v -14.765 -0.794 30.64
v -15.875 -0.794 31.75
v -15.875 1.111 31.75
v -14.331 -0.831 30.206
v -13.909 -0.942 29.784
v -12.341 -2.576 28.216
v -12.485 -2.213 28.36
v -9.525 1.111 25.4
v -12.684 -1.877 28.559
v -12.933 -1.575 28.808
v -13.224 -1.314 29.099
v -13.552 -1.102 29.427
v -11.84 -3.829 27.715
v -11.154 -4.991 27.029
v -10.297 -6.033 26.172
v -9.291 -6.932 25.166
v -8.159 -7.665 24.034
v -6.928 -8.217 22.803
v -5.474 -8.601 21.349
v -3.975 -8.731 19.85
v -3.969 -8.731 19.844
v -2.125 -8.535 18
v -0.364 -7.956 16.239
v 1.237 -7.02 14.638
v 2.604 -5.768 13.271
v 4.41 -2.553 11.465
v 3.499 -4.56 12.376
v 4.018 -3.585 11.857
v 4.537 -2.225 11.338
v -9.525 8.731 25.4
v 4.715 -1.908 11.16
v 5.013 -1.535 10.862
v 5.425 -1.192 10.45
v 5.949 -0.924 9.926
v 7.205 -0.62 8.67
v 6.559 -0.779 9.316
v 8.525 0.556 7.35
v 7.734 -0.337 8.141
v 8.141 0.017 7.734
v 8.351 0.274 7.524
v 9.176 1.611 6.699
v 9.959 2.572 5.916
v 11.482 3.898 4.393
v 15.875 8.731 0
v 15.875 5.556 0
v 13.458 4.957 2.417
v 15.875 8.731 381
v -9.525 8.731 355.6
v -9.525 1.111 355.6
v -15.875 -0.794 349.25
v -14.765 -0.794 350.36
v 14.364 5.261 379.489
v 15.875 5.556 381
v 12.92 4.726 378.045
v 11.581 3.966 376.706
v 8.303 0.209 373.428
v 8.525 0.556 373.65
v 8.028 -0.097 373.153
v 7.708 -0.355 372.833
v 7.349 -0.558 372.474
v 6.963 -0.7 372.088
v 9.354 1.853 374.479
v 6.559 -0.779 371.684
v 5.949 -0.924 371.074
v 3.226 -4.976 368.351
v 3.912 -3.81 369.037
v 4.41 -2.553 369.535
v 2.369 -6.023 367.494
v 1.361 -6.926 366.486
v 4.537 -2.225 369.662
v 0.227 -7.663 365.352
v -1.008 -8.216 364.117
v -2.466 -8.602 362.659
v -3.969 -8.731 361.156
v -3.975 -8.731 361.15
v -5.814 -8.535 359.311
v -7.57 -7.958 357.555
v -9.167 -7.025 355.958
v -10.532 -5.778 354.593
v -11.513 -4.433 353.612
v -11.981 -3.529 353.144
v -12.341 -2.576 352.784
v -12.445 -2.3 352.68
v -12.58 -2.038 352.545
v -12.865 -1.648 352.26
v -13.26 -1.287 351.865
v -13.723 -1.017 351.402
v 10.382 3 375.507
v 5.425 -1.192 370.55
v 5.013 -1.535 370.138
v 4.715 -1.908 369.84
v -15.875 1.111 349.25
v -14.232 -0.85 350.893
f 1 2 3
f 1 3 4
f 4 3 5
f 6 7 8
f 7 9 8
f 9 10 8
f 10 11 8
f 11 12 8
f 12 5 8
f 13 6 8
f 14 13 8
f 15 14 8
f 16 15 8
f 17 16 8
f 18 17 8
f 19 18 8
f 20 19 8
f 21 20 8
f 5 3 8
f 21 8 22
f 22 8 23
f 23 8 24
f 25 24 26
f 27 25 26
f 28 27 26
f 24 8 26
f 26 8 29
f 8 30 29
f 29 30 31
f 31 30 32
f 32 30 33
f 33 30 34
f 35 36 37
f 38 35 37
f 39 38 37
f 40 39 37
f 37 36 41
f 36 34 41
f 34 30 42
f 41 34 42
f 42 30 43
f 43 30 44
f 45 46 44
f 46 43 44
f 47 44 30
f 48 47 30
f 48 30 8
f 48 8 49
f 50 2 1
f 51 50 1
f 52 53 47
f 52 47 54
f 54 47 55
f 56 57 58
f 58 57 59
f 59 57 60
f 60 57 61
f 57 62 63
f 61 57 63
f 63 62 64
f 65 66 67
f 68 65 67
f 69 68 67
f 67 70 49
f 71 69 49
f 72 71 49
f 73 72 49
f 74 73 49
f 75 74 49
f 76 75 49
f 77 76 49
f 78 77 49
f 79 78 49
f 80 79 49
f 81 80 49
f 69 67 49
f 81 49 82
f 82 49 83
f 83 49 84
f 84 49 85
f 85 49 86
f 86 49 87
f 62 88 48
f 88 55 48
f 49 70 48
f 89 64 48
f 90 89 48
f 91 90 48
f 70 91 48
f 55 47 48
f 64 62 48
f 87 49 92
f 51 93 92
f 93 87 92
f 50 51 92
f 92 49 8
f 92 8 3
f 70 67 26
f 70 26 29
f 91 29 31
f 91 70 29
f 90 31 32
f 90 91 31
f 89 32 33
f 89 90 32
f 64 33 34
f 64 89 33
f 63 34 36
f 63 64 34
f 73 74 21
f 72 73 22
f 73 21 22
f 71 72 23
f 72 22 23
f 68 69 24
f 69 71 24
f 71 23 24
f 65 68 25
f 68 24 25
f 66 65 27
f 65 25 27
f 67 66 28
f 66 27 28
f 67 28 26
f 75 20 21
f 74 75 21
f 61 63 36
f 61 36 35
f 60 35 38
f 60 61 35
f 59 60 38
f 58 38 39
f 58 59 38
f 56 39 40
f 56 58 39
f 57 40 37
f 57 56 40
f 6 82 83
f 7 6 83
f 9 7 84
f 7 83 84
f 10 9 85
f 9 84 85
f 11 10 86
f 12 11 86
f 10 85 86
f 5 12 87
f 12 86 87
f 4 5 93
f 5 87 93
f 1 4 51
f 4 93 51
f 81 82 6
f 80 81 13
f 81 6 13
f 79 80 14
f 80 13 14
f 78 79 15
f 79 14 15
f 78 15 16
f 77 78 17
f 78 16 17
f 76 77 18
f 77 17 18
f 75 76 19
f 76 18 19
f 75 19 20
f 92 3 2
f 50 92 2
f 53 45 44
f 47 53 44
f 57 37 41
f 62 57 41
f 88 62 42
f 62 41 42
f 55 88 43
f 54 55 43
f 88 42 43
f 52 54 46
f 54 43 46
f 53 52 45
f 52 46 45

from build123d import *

# Parameters (mm, degrees)
F1_DEPTH = 381
F2_R     = 2.54
F3_R     = 2.54
F4_R     = 2.54
F5_W     = 6.35
F5_H     = 381
F6_DEPTH = 7.62
F8_DEPTH = 17.4635001


# Not quite as in the source:
# - ends of sketch curves that miss each other by under 0.0002 mm in the source are joined


with BuildPart() as f1:
    # F0 (on Top) → F1 (new body)
    with BuildSketch(Plane.XY):
        with BuildLine():
            Line((15.875, 5.55625), (15.875, 8.73125))
            Line((15.875, 8.73125), (-15.875, 8.73125))
            Line((-15.875, 8.73125), (-15.875, -0.79375))
            Line((-15.875, -0.79375), (-12.7, -0.79375))
            ThreePointArc((-12.7, -0.79375), (-9.8710707302, -6.4481459867), (-3.9751, -8.73125))
            Line((-3.9751, -8.73125), (-3.96875, -8.73125))
            ThreePointArc((-3.96875, -8.73125), (1.9312218072, -6.4502821485), (4.7625, -0.79375))
            Line((4.7625, -0.79375), (7.9375, -0.79375))
            ThreePointArc((7.9375, -0.79375), (10.9883747468, 3.5285940665), (15.875, 5.55625))
        make_face()
    extrude(amount=F1_DEPTH)

    # F2
    f2_edges = [f1.edges().sort_by_distance(p)[0] for p in [
        (7.9375, -0.79375, 190.5),
    ]]
    fillet(f2_edges, radius=F2_R)

    # F3
    f3_edges = [f1.edges().sort_by_distance(p)[0] for p in [
        (-12.7, -0.79375, 190.5),
    ]]
    fillet(f3_edges, radius=F3_R)

    # F4
    f4_edges = [f1.edges().sort_by_distance(p)[0] for p in [
        (4.7625, -0.79375, 190.5),
    ]]
    fillet(f4_edges, radius=F4_R)

    # F5 (on face) → F6 (cut)
    with BuildSketch(Plane(origin=(0, 8.73125, 0), x_dir=(-1, 0, 0), z_dir=(0, 1, 0))):
        with Locations((12.7, 190.5)):
            Rectangle(F5_W, F5_H)
    extrude(amount=-F6_DEPTH, mode=Mode.SUBTRACT)

    # F7 (on face) → F8 (cut, through all)
    with BuildSketch(Plane(origin=(0, 8.73125, 0), x_dir=(-1, 0, 0), z_dir=(0, 1, 0))):
        Polygon((15.875, 0), (15.875, 31.75), (-15.875, 0), align=None)
        Polygon((15.875, 381), (-15.875, 381), (15.875, 349.25), align=None)
    extrude(amount=-F8_DEPTH, mode=Mode.SUBTRACT)


solid = f1.part
